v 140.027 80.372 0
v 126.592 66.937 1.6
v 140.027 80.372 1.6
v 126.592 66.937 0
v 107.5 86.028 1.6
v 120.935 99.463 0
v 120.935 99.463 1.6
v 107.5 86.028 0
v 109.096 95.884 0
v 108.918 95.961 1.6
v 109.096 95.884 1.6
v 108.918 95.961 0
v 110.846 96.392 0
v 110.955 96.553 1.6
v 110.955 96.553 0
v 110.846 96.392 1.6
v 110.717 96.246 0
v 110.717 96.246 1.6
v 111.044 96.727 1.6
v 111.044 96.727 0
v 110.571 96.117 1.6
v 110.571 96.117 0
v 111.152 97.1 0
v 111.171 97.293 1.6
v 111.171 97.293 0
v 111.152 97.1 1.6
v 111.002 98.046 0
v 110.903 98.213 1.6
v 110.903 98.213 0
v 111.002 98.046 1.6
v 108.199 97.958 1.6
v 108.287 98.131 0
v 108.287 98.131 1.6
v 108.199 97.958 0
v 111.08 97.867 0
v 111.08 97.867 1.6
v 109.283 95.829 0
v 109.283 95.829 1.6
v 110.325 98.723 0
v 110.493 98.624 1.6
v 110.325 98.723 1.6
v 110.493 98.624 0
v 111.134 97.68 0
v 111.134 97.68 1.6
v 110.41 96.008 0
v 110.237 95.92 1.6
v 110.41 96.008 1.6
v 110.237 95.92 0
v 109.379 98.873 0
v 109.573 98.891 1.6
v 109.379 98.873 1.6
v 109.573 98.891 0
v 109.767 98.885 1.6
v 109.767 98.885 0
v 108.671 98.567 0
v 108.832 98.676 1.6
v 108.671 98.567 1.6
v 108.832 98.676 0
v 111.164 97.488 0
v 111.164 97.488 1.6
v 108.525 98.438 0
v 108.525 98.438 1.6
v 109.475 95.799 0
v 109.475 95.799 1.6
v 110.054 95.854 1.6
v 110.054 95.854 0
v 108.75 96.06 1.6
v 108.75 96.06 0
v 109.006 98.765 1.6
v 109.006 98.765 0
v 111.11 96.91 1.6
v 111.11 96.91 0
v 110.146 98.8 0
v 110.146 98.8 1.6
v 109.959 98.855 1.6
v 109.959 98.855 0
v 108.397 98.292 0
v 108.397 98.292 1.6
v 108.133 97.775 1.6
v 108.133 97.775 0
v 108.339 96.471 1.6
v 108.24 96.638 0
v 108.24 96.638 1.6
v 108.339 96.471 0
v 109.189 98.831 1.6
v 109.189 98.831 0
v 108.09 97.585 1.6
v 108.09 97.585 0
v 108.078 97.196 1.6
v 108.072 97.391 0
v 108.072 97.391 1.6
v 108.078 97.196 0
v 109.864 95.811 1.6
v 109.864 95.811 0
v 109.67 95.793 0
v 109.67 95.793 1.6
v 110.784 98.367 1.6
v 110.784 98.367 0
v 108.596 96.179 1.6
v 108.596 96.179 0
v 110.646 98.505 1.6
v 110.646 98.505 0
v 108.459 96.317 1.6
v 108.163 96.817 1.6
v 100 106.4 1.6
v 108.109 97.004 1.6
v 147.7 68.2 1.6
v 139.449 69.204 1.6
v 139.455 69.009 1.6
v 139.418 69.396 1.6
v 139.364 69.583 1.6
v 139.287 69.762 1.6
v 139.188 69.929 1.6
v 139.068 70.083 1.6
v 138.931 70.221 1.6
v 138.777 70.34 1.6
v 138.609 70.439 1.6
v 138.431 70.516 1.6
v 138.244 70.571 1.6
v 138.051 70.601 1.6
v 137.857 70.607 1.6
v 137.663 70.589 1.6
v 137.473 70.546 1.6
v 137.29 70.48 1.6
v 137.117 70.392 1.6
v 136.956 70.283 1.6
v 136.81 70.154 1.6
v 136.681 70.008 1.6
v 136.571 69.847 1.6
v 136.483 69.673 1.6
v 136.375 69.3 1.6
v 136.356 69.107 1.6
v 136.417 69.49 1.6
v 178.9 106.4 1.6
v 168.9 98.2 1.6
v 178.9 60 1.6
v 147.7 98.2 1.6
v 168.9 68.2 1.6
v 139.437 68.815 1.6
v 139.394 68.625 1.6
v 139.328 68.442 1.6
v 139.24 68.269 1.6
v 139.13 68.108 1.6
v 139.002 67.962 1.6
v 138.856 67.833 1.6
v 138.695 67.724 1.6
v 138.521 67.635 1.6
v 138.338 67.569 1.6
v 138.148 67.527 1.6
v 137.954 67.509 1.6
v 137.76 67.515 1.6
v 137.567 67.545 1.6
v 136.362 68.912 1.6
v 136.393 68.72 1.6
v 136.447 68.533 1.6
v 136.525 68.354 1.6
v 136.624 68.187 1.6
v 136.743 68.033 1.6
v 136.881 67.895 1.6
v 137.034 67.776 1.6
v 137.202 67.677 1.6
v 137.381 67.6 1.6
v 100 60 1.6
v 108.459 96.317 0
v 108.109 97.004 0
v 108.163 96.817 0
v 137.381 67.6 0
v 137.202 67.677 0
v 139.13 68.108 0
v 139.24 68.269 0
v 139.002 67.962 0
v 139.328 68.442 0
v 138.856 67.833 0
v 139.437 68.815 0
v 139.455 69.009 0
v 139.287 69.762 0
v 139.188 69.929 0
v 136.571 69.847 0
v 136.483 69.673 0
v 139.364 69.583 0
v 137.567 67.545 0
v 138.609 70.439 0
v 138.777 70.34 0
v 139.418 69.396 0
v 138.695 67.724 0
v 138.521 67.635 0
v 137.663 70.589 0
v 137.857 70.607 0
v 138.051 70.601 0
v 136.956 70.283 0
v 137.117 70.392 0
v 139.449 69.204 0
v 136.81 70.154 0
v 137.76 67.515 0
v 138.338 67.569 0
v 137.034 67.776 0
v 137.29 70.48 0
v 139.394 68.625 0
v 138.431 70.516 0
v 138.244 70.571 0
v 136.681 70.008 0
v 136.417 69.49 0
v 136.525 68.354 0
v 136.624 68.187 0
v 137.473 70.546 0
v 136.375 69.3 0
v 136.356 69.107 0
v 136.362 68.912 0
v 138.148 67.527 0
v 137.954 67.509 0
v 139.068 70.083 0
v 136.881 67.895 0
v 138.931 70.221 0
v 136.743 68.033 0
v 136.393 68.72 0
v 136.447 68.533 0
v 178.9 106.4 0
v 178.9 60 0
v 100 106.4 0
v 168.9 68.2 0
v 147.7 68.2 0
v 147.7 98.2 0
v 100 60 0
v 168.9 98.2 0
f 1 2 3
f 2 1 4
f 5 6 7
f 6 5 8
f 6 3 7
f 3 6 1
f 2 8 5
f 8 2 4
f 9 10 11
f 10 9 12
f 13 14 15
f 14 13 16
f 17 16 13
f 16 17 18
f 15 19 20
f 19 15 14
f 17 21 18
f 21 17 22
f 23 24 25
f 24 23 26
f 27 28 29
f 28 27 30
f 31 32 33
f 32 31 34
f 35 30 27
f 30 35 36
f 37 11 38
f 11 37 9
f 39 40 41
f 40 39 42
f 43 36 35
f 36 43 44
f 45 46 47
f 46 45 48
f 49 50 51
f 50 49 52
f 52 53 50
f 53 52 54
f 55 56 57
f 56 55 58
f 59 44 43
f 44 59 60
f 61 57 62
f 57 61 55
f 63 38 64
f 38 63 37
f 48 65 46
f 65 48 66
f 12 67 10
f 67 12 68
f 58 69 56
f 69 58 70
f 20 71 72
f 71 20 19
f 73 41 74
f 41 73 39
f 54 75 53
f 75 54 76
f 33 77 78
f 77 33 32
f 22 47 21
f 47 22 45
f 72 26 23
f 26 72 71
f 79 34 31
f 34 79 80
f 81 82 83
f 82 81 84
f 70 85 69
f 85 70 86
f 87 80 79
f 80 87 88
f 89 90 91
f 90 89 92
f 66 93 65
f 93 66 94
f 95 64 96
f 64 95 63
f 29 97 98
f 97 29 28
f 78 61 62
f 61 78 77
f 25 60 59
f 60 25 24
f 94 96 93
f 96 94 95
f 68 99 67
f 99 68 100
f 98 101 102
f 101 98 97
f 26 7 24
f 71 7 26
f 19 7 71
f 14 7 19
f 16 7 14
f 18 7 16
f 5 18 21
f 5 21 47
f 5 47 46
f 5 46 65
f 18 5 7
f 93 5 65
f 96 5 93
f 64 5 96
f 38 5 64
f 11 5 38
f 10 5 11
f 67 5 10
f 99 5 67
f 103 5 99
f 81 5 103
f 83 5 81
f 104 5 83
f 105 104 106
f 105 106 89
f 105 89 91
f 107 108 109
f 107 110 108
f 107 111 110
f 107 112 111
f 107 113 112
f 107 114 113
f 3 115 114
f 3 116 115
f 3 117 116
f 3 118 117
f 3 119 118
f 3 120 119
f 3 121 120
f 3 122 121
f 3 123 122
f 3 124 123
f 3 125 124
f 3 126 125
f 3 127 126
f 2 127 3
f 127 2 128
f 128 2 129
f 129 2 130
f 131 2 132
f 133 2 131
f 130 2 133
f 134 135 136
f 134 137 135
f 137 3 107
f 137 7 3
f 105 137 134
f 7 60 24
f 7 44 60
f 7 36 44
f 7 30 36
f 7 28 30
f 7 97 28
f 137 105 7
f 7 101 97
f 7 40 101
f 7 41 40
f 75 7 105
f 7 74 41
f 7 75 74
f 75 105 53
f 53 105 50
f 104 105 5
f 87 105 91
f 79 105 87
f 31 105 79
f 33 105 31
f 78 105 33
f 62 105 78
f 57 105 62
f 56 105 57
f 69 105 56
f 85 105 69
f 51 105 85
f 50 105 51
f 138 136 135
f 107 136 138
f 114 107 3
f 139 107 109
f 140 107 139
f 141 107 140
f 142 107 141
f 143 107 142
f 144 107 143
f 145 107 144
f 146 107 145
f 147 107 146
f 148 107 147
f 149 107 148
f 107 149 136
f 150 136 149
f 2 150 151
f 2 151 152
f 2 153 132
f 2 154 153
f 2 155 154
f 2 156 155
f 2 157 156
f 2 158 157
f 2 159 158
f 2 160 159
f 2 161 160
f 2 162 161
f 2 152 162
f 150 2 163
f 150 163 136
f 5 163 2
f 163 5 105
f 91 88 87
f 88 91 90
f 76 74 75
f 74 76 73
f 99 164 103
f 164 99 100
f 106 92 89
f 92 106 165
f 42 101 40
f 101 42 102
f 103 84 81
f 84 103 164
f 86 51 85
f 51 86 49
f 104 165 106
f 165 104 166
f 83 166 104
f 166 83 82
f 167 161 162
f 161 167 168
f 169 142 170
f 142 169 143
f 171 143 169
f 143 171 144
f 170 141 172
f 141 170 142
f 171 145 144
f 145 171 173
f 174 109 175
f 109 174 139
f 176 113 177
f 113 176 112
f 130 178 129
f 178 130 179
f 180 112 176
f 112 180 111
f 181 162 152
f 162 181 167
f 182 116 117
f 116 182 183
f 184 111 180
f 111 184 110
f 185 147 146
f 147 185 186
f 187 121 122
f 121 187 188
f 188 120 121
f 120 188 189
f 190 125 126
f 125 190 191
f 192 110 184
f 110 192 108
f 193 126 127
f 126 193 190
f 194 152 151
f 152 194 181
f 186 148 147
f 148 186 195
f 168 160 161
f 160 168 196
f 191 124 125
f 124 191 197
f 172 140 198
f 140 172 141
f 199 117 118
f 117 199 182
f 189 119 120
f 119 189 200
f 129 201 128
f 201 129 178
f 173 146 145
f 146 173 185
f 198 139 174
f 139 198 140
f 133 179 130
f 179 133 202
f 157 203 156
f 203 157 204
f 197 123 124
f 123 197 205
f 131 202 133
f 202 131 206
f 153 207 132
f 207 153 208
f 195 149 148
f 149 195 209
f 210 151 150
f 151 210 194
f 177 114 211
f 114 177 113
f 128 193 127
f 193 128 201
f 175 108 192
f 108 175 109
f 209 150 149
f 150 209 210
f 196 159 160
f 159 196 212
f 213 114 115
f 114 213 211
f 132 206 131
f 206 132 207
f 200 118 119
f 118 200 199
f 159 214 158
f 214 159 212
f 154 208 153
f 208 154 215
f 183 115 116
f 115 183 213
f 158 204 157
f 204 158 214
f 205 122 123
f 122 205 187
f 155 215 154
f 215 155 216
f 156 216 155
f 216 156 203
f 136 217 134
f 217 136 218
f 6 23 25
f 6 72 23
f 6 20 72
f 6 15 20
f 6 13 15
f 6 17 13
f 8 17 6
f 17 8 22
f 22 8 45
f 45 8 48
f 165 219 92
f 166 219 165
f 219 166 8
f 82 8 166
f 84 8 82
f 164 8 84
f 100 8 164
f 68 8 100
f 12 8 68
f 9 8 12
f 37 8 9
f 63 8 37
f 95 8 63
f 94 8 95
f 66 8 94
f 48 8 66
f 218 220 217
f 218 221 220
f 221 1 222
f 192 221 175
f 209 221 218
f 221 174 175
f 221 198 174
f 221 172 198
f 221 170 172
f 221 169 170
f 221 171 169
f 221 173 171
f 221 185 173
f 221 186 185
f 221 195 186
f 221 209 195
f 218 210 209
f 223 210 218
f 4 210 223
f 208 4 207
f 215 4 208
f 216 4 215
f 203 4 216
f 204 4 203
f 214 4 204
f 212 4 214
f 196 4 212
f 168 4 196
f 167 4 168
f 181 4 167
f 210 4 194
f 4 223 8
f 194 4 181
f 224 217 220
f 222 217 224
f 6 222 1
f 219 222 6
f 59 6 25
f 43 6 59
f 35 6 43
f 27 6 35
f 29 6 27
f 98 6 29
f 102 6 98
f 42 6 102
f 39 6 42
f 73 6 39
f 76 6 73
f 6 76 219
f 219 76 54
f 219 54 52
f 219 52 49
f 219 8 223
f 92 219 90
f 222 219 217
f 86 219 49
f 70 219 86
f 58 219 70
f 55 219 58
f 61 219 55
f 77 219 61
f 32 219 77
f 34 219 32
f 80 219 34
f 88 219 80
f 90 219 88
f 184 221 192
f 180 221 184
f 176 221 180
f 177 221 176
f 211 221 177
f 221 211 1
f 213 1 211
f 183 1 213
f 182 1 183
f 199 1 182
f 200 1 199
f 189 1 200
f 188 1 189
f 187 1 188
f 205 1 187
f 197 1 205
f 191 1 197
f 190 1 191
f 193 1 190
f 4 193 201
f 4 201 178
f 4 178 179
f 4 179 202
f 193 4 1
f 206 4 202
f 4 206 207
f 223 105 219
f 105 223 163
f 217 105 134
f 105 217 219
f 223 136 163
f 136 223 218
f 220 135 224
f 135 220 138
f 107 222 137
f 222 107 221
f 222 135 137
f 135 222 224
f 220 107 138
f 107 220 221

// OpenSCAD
//

$fn=50;
nozzle=0.8;
wall=nozzle*2;
clearance=0.2;
//
h=50;
x=82.5; //
y=175;
panel_thickness = 3.0;
powersupply_x=55.7;
powersupply_y=105.6;
powersupply_y_offset=28;

mains_switch_width = 21.2;
mains_switch_height = 30.0;

mains_inlet_width = 27.0;
mains_inlet_height = 19.0;
mains_inlet_mount_hole_pitch = 40.0;
mains_inlet_rotation_angle = 45.0;

module border_support() {
difference(){
cube([wall*2,wall*2,h/2+4]);
translate([-0.5,wall,h/2]) rotate([90,0,0])        linear_extrude(height = wall*3, center = true, convexity = 10, twist = 0)
            polygon([[0,0],
                     [0,6],
                     [2,6],
                     [2,4]]);
}
}
module frontpanel(){
	x=x-wall*2-clearance*2;
	h=h-wall*2-clearance*2;
	difference(){
	cube([x,h,wall]);
	//translate([x/2-22.5/2,h/2-7,-0.5]) cube([22.5,14,wall+1]);
	translate([x/2-22.5/2-16.75,h/2,-0.5]) cylinder(d=12, h=wall+1);
	//translate([x/2-22.5/2-16.75+12,h/2,-0.5]) cylinder(d=3.2, h=wall+1);
	translate([x/2-22.5/2-16.75+12,h/2-7.29,-0.5]) cylinder(d=3.2, h=wall+1);
	translate([x/2+22.5/2+16.05,h/2,-0.5]) cylinder(d=7, h=wall+1);
	translate([x/2+22.5/2+16.05,h/2+6,-0.5]) cylinder(d=3, h=wall);
	}
}
module rearpanel(){
	x=x-wall*2-clearance*2;
	h=h-wall*2-clearance*2;
	difference(){
	cube([x,h,wall]);
        // The mains inlet
        
    rotated_height = mains_inlet_height * cos(mains_inlet_rotation_angle) + mains_inlet_width * sin(mains_inlet_rotation_angle);
	translate([7.5, (h + rotated_height) / 2 - mains_inlet_height * cos(mains_inlet_rotation_angle), -0.5]) rotate([0, 0, -mains_inlet_rotation_angle]) {
        union() {
            cube([mains_inlet_width, mains_inlet_height, wall+1]);
            translate([-(mains_inlet_mount_hole_pitch - mains_inlet_width)/2, mains_inlet_height/2, -0.5]) cylinder(d=3.1, h =wall+1);
            translate([(mains_inlet_mount_hole_pitch + mains_inlet_width)/2, mains_inlet_height/2, -0.5]) cylinder(d=3.1, h =wall+1);
            }
        }
        // The mains switch
    translate([x - 10 - mains_switch_width, h/2 - mains_switch_height/2, -0.5]) cube([mains_switch_width, mains_switch_height, wall+1]);    
	}
}

module bottom(){

difference(){
        union(){
		difference(){
		cube([x,y,h/2]);
		translate([wall,wall*2+panel_thickness+clearance*2,wall]) cube([x-wall*2,y-wall*4-panel_thickness*2-clearance*4,h/2+wall]);
		}
//support for power supply
		translate([x/2-powersupply_x/2,y-powersupply_y_offset,0]) cylinder(d=6, h=4+wall);
		translate([x/2+powersupply_x/2,y-powersupply_y_offset,0]) cylinder(d=6, h=4+wall);
		translate([x/2-powersupply_x/2,y-powersupply_y_offset-powersupply_y,0]) cylinder(d=6, h=4+wall);
		translate([x/2+powersupply_x/2,y-powersupply_y_offset-powersupply_y,0]) cylinder(d=6, h=4+wall);
//top support screw
		hull(){
		translate([wall+8/2,y-wall*3-8/2,0]) cylinder(d=8, h=h/2);
		translate([0,y-wall*3-8,0]) cube([wall,8,h/2]);
		translate([wall,y-wall*3,0]) cube([8,wall,h/2]);
		}
		hull(){
		translate([x-wall-8/2,y-wall*3-8/2,0]) cylinder(d=8, h=h/2);
		translate([x-wall,y-wall*3-8,0]) cube([wall,8,h/2]);
		translate([x-wall-8,y-wall*3,0]) cube([8,wall,h/2]);
		}
		hull(){
		translate([wall+8/2,15+wall*3+8/2,0]) cylinder(d=8, h=h/2);
		translate([0,15+wall*3,0]) cube([wall,8,h/2]);
		}
		hull(){
		translate([x-wall-8/2,15+wall*3+8/2,0]) cylinder(d=8, h=h/2);
		translate([x-wall,15+wall*3,0]) cube([wall,8,h/2]);
		}
	}
	//front
	translate([wall*2,-wall,wall*2]) cube([x-wall*4,wall*4+panel_thickness,h/2]);
	translate([wall,wall,wall]) cube([x-wall*2,panel_thickness+clearance*2,h/2+wall]);
	//rear
	translate([wall*2,y-wall*2,wall*2]) cube([x-wall*4,wall*2+panel_thickness,h/2]);
	translate([wall+8,y-wall*3-panel_thickness,wall*2]) cube([x-wall*2-16,wall*4+panel_thickness,h/2]);
	translate([wall,y-wall-panel_thickness-clearance*2,wall]) cube([x-wall*2,panel_thickness+clearance*2,h/2+wall]);
//screw support for power supply
	translate([x/2-powersupply_x/2,y-powersupply_y_offset,0.2]) cylinder(d=2.8, h=4+wall);
	translate([x/2+powersupply_x/2,y-powersupply_y_offset,0.2]) cylinder(d=2.8, h=4+wall);
	translate([x/2-powersupply_x/2,y-powersupply_y_offset-powersupply_y,0.2]) cylinder(d=2.8, h=4+wall);
	translate([x/2+powersupply_x/2,y-powersupply_y_offset-powersupply_y,0.2]) cylinder(d=2.8, h=4+wall);
//top screw
	translate([wall+8/2,y-wall*3-8/2,-1]) cylinder(d=3, h=h);
	translate([x-wall-8/2,y-wall*3-8/2,-1]) cylinder(d=3, h=h);
	translate([wall+8/2,15+wall*3+8/2,-1]) cylinder(d=3, h=h);
	translate([x-wall-8/2,15+wall*3+8/2,-1]) cylinder(d=3, h=h);
//top screw head
	translate([wall+8/2,y-wall*3-8/2,-2]) cylinder(d=6, h=h/2);
	translate([x-wall-8/2,y-wall*3-8/2,-2]) cylinder(d=6, h=h/2);
	translate([wall+8/2,15+wall*3+8/2,-2]) cylinder(d=6, h=h/2);
	translate([x-wall-8/2,15+wall*3+8/2,-2]) cylinder(d=6, h=h/2);
}

//support with top
translate([wall,y/4-wall*3,0]) rotate([0,0,0]) border_support();
translate([wall,y/4*2-wall*3,0]) rotate([0,0,0]) border_support();
translate([wall,y/4*3-wall*3,0]) rotate([0,0,0]) border_support();
translate([x-wall,y/4+wall*3,0]) rotate([0,0,180]) border_support();
translate([x-wall,y/4*2+wall*3,0]) rotate([0,0,180]) border_support();
translate([x-wall,y/4*3+wall*3,0]) rotate([0,0,180]) border_support();
}

module top(){

difference(){
        union(){
		difference(){
		cube([x,y,h/2]);
		translate([wall,wall*2+panel_thickness+clearance*2,wall]) cube([x-wall*2,y-wall*4-panel_thickness*2-clearance*4,h/2+wall]);
		}
//top support screw
		hull(){
		translate([wall+8/2,y-wall*3-8/2,0]) cylinder(d=8, h=h/2);
		translate([0,y-wall*3-8,0]) cube([wall,8,h/2]);
		translate([wall,y-wall*3,0]) cube([8,wall,h/2]);
		}
		hull(){
		translate([x-wall-8/2,y-wall*3-8/2,0]) cylinder(d=8, h=h/2);
		translate([x-wall,y-wall*3-8,0]) cube([wall,8,h/2]);
		translate([x-wall-8,y-wall*3,0]) cube([8,wall,h/2]);
		}
		hull(){
		translate([wall+8/2,15+wall*3+8/2,0]) cylinder(d=8, h=h/2);
		translate([0,15+wall*3,0]) cube([wall,8,h/2]);
		}
		hull(){
		translate([x-wall-8/2,15+wall*3+8/2,0]) cylinder(d=8, h=h/2);
		translate([x-wall,15+wall*3,0]) cube([wall,8,h/2]);
		}
	}
	//front
    translate([wall*2,-wall,wall*2]) cube([x-wall*4,wall*4+panel_thickness,h/2]);
	translate([wall,wall,wall]) cube([x-wall*2,panel_thickness+clearance*2,h/2+wall]);
	//rear
    translate([wall*2,y-wall*2,wall*2]) cube([x-wall*4,wall*2+panel_thickness,h/2]);
	translate([wall+8,y-wall*3-panel_thickness,wall*2]) cube([x-wall*2-16,wall*4+panel_thickness,h/2]);
	translate([wall,y-wall-panel_thickness-clearance*2,wall]) cube([x-wall*2,panel_thickness+clearance*2,h/2+wall]);
//top screw
	translate([wall+8/2,y-wall*3-8/2,1]) cylinder(d=2.7, h=h);
	translate([x-wall-8/2,y-wall*3-8/2,1]) cylinder(d=2.7, h=h);
	translate([wall+8/2,15+wall*3+8/2,1]) cylinder(d=2.7, h=h);
	translate([x-wall-8/2,15+wall*3+8/2,1]) cylinder(d=2.7, h=h);
}

//support with top
translate([wall,y/4-wall*3,0]) rotate([0,0,0]) border_support();
translate([wall,y/4*2-wall*3,0]) rotate([0,0,0]) border_support();
translate([wall,y/4*3-wall*3,0]) rotate([0,0,0]) border_support();
translate([x-wall,y/4+wall*3,0]) rotate([0,0,180]) border_support();
translate([x-wall,y/4*2+wall*3,0]) rotate([0,0,180]) border_support();
translate([x-wall,y/4*3+wall*3,0]) rotate([0,0,180]) border_support();
}
//rotate([0,180,0]) translate([-100-x+wall*2,0,0]) frontpanel();
translate([100,60,0]) rearpanel();
//translate([-100,0,0]) top();
//bottom();
